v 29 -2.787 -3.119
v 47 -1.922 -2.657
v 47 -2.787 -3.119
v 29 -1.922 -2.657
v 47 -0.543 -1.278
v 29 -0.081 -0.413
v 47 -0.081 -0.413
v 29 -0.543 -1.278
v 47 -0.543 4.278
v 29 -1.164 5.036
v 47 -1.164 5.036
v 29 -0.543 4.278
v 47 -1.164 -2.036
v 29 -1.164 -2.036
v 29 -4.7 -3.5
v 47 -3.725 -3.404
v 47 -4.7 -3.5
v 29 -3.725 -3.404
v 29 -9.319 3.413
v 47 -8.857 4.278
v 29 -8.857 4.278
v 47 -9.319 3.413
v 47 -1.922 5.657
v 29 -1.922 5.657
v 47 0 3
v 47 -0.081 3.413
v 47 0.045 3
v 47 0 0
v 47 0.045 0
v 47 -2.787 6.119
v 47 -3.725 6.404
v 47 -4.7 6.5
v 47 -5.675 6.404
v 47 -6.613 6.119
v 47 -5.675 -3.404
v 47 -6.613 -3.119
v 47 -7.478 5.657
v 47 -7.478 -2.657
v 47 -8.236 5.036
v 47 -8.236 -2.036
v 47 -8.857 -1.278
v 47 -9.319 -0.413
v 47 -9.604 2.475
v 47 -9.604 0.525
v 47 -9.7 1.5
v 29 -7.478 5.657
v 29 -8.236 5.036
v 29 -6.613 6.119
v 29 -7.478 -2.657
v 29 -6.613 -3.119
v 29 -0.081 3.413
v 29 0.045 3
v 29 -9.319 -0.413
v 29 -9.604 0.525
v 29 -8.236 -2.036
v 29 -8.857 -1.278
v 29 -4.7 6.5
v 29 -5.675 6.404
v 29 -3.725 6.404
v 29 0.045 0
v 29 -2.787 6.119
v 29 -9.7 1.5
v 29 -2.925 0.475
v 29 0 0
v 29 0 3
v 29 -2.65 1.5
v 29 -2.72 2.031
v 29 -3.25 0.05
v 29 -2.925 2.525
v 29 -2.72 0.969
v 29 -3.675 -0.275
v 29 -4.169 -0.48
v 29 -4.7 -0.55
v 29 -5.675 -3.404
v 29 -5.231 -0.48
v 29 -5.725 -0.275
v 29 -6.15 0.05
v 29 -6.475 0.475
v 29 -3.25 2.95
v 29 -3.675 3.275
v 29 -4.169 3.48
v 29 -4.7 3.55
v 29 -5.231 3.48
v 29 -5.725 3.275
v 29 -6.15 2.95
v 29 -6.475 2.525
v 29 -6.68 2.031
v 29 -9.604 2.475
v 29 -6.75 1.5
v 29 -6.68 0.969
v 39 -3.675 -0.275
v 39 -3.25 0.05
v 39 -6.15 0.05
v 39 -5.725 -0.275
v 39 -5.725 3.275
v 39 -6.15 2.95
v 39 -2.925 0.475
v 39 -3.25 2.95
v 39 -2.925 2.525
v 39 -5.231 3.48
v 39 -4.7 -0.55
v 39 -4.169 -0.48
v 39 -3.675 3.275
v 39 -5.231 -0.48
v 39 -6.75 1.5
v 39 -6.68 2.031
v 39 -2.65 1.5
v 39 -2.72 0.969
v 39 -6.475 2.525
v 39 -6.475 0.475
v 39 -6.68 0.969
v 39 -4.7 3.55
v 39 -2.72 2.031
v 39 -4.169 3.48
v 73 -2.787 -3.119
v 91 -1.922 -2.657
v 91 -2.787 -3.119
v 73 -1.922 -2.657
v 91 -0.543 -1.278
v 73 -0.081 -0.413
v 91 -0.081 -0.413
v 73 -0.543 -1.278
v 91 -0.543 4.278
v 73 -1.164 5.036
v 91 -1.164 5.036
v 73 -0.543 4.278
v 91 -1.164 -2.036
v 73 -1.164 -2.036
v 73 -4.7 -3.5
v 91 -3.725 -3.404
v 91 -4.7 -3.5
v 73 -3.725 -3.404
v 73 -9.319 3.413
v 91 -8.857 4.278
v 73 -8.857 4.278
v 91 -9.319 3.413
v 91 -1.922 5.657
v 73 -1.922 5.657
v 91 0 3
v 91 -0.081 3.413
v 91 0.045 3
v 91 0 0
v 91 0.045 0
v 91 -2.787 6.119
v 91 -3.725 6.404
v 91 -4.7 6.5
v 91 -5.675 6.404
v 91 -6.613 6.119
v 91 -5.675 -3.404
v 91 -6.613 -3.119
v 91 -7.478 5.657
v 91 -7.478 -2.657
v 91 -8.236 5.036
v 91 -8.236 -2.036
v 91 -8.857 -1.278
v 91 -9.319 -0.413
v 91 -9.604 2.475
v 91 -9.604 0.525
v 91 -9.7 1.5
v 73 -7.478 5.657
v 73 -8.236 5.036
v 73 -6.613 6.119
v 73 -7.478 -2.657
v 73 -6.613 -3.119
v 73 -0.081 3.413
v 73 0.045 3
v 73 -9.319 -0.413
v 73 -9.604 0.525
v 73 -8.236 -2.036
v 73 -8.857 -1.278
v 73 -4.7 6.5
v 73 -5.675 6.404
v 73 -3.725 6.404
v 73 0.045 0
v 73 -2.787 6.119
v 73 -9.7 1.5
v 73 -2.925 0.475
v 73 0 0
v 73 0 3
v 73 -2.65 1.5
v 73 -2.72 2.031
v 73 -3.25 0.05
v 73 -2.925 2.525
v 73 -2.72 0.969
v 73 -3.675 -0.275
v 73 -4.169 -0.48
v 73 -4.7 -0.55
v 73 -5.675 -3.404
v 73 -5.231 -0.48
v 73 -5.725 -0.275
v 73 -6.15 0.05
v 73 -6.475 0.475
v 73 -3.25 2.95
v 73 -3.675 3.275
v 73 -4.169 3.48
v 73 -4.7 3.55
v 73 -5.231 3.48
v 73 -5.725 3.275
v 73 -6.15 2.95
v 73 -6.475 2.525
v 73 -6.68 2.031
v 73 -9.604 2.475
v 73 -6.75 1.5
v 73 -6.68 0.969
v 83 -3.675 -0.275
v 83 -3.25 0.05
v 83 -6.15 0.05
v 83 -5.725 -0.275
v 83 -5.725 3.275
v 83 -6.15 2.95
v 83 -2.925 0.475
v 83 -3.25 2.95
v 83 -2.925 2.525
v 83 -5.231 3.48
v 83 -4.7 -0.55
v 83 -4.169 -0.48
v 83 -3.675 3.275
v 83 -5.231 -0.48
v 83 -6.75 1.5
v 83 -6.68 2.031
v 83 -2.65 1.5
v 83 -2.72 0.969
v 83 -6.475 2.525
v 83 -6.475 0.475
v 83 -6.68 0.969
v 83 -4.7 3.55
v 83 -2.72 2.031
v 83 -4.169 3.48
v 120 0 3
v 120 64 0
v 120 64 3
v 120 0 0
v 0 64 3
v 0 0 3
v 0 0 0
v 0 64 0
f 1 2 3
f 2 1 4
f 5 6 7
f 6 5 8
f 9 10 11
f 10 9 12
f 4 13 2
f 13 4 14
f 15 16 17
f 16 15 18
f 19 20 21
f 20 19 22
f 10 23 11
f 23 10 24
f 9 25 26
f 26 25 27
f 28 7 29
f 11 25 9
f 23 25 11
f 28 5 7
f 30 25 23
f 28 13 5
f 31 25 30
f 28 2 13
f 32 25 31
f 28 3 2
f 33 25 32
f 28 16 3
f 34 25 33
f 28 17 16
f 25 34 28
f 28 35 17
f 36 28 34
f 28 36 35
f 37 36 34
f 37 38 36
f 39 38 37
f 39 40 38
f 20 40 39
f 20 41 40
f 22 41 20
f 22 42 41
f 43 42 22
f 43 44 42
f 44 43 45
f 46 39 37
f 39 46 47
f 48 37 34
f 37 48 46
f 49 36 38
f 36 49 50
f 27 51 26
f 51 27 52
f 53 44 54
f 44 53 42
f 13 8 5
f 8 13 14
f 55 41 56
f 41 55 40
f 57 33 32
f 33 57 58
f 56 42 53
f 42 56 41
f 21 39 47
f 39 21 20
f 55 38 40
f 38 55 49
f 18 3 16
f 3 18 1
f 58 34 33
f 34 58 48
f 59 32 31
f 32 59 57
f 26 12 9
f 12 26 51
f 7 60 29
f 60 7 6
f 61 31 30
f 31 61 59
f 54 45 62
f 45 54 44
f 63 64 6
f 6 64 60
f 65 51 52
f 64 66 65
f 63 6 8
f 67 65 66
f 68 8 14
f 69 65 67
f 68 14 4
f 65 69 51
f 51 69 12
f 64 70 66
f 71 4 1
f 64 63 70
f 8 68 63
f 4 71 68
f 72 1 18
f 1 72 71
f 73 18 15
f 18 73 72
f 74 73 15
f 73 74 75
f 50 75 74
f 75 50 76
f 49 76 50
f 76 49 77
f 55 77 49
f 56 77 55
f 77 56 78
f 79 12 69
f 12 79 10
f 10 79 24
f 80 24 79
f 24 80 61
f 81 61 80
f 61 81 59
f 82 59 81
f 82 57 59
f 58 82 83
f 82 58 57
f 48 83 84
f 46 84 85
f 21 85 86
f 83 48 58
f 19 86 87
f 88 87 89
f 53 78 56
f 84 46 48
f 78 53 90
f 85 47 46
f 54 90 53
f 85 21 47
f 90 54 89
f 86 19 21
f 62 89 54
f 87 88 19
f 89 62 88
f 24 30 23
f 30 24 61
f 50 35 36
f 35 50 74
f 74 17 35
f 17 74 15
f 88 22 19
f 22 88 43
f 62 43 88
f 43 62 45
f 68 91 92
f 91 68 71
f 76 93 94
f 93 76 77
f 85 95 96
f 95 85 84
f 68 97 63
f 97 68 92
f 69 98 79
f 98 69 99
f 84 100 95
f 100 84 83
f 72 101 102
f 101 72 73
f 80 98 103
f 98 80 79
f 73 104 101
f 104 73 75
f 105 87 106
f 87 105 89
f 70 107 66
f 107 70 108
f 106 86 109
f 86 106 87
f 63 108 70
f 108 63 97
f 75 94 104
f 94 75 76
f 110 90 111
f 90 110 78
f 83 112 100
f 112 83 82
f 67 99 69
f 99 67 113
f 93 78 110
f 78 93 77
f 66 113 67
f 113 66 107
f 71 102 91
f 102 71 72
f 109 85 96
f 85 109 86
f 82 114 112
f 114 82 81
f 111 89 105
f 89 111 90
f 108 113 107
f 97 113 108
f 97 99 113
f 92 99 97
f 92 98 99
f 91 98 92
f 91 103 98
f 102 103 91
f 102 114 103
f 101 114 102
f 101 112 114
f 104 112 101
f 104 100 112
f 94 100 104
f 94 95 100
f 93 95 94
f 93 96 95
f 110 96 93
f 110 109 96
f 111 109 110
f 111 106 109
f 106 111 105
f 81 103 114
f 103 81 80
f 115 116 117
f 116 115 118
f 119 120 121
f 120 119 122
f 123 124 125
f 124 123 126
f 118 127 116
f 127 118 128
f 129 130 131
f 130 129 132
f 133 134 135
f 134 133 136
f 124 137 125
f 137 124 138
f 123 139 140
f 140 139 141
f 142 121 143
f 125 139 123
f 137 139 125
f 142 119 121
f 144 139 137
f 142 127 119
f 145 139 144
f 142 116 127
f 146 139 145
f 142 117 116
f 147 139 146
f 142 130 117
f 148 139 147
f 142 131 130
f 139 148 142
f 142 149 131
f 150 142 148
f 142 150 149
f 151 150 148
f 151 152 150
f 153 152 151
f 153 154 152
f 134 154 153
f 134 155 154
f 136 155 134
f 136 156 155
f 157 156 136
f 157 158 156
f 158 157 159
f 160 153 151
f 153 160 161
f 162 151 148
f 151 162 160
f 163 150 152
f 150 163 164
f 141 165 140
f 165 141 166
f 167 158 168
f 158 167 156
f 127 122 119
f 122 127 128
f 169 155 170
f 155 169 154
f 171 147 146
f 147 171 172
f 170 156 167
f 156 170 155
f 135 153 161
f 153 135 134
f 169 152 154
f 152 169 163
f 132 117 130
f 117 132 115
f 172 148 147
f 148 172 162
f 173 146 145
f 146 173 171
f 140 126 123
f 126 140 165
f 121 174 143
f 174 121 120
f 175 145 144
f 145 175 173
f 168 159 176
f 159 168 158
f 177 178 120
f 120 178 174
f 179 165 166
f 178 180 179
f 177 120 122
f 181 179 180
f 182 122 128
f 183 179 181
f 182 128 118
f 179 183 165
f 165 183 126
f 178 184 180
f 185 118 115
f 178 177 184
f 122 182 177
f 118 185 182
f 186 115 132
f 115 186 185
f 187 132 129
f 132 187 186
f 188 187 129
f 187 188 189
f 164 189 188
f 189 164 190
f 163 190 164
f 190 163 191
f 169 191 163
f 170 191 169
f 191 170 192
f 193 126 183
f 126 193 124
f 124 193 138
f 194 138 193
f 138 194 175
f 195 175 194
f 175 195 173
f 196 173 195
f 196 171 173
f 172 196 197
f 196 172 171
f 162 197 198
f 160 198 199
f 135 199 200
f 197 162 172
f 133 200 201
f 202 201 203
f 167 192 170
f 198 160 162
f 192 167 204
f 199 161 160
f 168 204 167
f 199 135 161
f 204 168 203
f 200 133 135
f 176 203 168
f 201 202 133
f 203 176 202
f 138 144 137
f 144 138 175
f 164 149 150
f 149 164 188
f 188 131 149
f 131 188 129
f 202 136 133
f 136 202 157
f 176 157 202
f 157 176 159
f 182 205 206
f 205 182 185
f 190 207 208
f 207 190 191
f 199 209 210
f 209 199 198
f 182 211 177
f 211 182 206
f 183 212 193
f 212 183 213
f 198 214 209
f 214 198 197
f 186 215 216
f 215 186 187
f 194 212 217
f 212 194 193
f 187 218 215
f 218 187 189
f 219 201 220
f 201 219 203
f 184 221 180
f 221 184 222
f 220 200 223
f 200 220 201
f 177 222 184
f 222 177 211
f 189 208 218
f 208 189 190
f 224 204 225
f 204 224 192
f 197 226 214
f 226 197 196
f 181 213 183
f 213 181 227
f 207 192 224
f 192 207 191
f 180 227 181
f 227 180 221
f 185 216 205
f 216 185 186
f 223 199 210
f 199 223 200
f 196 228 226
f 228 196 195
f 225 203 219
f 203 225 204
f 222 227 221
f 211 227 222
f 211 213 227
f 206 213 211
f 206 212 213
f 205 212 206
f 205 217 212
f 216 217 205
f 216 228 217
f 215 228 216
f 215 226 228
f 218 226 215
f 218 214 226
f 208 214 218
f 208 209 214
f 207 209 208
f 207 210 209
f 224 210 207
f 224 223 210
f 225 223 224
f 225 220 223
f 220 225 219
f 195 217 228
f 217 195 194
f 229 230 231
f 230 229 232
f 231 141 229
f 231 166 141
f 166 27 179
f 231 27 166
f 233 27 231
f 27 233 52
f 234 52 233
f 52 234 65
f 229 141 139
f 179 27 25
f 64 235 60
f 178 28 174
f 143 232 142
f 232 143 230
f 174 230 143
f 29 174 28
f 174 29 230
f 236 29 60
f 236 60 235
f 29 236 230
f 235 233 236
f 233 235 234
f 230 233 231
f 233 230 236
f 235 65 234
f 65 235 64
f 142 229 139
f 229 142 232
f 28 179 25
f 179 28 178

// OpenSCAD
// file: hinge_v2.scad
// ============================================================
// hinge_v2.scad — shared piano-hinge knuckle geometry
// Pattern along the hinge edge: BASE-FLAP-BASE-FLAP-BASE (5 segments)
// Segment index 0,2,4 = fixed to BASE (rod spins freely inside)
// Segment index 1,3   = fixed to FLAP (rod glued/pinned, rotates with flap)
// ============================================================
include <params_v2.scad>

PATTERN_TOTAL = 5 * KNUCKLE_LEN + 4 * KNUCKLE_GAP;
PATTERN_MARGIN = (FLAP_LEN - PATTERN_TOTAL) / 2;

// Returns the x-start position of segment index i (0..4)
function knuckle_x(i) = PATTERN_MARGIN + i * (KNUCKLE_LEN + KNUCKLE_GAP);

// A single knuckle cylinder, axis along X, with a through-bore for the rod.
// hole_d: ROD_D + ROD_CLEARANCE for a bearing (base) knuckle,
//         ROD_D + 0.1 for a tight/glued (flap) knuckle.
module knuckle(hole_d) {
    difference() {
        rotate([0, 90, 0])
            cylinder(d = KNUCKLE_OD, h = KNUCKLE_LEN, $fn = 32);
        rotate([0, 90, 0])
            cylinder(d = hole_d, h = KNUCKLE_LEN + 2, center = true, $fn = 24);
    }
}

// Row of knuckles at given indices, positioned along X starting at x_offset,
// centered on Y=0 locally (caller translates to the actual hinge edge).
module knuckle_row(indices, hole_d, x_offset = 0) {
    for (i = indices) {
        translate([x_offset + knuckle_x(i), 0, 0])
            knuckle(hole_d);
    }
}

BASE_KNUCKLE_INDICES = [0, 2, 4];
FLAP_KNUCKLE_INDICES = [1, 3];
// file: params_v2.scad
// ============================================================
// Cat Bowl v1 — Round Bowl + Dual Trapdoor Flaps (piano-hinge)
// params_v2.scad — all key dimensions live here
// ============================================================
// NOTE: Independent of the old params.scad (rectangular body /
// halo antenna / hopper design). This is a clean start for the
// current hardware: round 108mm bowl + 2x MG996R servos.
// ============================================================

$fn = 64;

// ---- Bowl (as given: 108mm diameter, 40mm deep) ----
BOWL_DIA      = 108;
BOWL_DEPTH    = 40;
BOWL_RADIUS   = BOWL_DIA / 2;

// ---- Base block (square footprint, round pocket inside) ----
WALL          = 6;                       // wall thickness around bowl pocket
FLOOR_T       = 4;                       // floor thickness under bowl
BASE_SIZE     = BOWL_DIA + 2 * WALL;     // 120mm square
BASE_HEIGHT   = BOWL_DEPTH + FLOOR_T;    // 44mm — top of base = hinge rod height

// ---- Flap (two rectangular flaps, each covers half the top) ----
FLAP_LEN      = BASE_SIZE;               // runs full width along hinge edge (120mm)
FLAP_OVERLAP  = 4;                       // extra reach past centerline for sealing
FLAP_DEPTH    = BASE_SIZE / 2 + FLAP_OVERLAP;  // 64mm
FLAP_T        = 3;                       // flap panel thickness

// ---- Piano hinge (rod + knuckles) ----
ROD_D         = 4;                       // steel/brass rod diameter (verify what you have)
ROD_CLEARANCE = 0.4;                     // bearing clearance for knuckles that spin freely
KNUCKLE_OD    = ROD_D + 6;               // 10mm knuckle outer diameter
KNUCKLE_LEN   = 18;                      // length of each knuckle segment
KNUCKLE_GAP   = 4;                       // gap between knuckle segments
// Alternating pattern along the FLAP_LEN edge: base-flap-base-flap-base (5 segments)
// 3 fixed (base) knuckles + 2 rotating (flap) knuckles, interleaved
ROD_END_PROTRUDE = 12;                   // rod extends past the base footprint for servo coupling
ROD_LENGTH    = FLAP_LEN + 2 * ROD_END_PROTRUDE;
// Rod axis sits at the flap's mid-thickness height when the flap is closed
// and resting on top of the base — NOT at the bare top surface.
ROD_AXIS_Z    = BASE_HEIGHT + FLAP_T / 2;

// ---- MG996R servo (verify with calipers once yours arrive) ----
SERVO_W       = 40.7;   // body length
SERVO_D       = 19.7;   // body width/depth
SERVO_H       = 42.9;   // body height (shaft side up)
SERVO_SHAFT_OFFSET = 30.9; // distance from back edge to shaft, along SERVO_W
SERVO_TAB_SPAN = 54.5;  // outer tab-to-tab width
SERVO_TAB_HOLE_SPACING = 10; // hole spacing within each tab
SERVO_HORN_OD = 24;     // round disc horn diameter (verify)
SERVO_HORN_BOLT_CIRCLE = 19; // horn screw hole circle diameter (verify)

// ---- Mounting hardware ----
M3_CLEAR      = 3.4;    // M3 clearance hole
M3_HEAD       = 6.2;    // M3 pan head clearance
// main file
// ============================================================
// 21_flap_v2.scad — one trapdoor flap (print x2)
// Local frame: hinge edge at Y=0, panel extends to Y=+FLAP_DEPTH,
// thickness Z=0..FLAP_T. Knuckles protrude to Y<0, centered on
// mid-thickness (Z=FLAP_T/2) so they line up with the base's
// knuckle row when the flap sits closed on top of the base.
// Print orientation: lay flat, panel face down, knuckles up —
// or print on its long edge to avoid overhangs on the knuckles;
// test one first.
// ============================================================
include <params_v2.scad>
include <hinge_v2.scad>

module flap_panel() {
    // slight taper/chamfer on the leading (free) edge could be added later;
    // v1 keeps it a simple flat panel for print simplicity.
    cube([FLAP_LEN, FLAP_DEPTH, FLAP_T]);
}

module flap_hinge_knuckles() {
    hole_d = ROD_D + 0.1; // tight fit — glue or press-fit onto the rod
    overlap = 0.3; // ensure solid union with panel, not just a tangent touch
    translate([0, -KNUCKLE_OD / 2 + overlap, FLAP_T / 2])
        knuckle_row(FLAP_KNUCKLE_INDICES, hole_d);
}

module flap_assembly() {
    flap_panel();
    flap_hinge_knuckles();
}

flap_assembly();
